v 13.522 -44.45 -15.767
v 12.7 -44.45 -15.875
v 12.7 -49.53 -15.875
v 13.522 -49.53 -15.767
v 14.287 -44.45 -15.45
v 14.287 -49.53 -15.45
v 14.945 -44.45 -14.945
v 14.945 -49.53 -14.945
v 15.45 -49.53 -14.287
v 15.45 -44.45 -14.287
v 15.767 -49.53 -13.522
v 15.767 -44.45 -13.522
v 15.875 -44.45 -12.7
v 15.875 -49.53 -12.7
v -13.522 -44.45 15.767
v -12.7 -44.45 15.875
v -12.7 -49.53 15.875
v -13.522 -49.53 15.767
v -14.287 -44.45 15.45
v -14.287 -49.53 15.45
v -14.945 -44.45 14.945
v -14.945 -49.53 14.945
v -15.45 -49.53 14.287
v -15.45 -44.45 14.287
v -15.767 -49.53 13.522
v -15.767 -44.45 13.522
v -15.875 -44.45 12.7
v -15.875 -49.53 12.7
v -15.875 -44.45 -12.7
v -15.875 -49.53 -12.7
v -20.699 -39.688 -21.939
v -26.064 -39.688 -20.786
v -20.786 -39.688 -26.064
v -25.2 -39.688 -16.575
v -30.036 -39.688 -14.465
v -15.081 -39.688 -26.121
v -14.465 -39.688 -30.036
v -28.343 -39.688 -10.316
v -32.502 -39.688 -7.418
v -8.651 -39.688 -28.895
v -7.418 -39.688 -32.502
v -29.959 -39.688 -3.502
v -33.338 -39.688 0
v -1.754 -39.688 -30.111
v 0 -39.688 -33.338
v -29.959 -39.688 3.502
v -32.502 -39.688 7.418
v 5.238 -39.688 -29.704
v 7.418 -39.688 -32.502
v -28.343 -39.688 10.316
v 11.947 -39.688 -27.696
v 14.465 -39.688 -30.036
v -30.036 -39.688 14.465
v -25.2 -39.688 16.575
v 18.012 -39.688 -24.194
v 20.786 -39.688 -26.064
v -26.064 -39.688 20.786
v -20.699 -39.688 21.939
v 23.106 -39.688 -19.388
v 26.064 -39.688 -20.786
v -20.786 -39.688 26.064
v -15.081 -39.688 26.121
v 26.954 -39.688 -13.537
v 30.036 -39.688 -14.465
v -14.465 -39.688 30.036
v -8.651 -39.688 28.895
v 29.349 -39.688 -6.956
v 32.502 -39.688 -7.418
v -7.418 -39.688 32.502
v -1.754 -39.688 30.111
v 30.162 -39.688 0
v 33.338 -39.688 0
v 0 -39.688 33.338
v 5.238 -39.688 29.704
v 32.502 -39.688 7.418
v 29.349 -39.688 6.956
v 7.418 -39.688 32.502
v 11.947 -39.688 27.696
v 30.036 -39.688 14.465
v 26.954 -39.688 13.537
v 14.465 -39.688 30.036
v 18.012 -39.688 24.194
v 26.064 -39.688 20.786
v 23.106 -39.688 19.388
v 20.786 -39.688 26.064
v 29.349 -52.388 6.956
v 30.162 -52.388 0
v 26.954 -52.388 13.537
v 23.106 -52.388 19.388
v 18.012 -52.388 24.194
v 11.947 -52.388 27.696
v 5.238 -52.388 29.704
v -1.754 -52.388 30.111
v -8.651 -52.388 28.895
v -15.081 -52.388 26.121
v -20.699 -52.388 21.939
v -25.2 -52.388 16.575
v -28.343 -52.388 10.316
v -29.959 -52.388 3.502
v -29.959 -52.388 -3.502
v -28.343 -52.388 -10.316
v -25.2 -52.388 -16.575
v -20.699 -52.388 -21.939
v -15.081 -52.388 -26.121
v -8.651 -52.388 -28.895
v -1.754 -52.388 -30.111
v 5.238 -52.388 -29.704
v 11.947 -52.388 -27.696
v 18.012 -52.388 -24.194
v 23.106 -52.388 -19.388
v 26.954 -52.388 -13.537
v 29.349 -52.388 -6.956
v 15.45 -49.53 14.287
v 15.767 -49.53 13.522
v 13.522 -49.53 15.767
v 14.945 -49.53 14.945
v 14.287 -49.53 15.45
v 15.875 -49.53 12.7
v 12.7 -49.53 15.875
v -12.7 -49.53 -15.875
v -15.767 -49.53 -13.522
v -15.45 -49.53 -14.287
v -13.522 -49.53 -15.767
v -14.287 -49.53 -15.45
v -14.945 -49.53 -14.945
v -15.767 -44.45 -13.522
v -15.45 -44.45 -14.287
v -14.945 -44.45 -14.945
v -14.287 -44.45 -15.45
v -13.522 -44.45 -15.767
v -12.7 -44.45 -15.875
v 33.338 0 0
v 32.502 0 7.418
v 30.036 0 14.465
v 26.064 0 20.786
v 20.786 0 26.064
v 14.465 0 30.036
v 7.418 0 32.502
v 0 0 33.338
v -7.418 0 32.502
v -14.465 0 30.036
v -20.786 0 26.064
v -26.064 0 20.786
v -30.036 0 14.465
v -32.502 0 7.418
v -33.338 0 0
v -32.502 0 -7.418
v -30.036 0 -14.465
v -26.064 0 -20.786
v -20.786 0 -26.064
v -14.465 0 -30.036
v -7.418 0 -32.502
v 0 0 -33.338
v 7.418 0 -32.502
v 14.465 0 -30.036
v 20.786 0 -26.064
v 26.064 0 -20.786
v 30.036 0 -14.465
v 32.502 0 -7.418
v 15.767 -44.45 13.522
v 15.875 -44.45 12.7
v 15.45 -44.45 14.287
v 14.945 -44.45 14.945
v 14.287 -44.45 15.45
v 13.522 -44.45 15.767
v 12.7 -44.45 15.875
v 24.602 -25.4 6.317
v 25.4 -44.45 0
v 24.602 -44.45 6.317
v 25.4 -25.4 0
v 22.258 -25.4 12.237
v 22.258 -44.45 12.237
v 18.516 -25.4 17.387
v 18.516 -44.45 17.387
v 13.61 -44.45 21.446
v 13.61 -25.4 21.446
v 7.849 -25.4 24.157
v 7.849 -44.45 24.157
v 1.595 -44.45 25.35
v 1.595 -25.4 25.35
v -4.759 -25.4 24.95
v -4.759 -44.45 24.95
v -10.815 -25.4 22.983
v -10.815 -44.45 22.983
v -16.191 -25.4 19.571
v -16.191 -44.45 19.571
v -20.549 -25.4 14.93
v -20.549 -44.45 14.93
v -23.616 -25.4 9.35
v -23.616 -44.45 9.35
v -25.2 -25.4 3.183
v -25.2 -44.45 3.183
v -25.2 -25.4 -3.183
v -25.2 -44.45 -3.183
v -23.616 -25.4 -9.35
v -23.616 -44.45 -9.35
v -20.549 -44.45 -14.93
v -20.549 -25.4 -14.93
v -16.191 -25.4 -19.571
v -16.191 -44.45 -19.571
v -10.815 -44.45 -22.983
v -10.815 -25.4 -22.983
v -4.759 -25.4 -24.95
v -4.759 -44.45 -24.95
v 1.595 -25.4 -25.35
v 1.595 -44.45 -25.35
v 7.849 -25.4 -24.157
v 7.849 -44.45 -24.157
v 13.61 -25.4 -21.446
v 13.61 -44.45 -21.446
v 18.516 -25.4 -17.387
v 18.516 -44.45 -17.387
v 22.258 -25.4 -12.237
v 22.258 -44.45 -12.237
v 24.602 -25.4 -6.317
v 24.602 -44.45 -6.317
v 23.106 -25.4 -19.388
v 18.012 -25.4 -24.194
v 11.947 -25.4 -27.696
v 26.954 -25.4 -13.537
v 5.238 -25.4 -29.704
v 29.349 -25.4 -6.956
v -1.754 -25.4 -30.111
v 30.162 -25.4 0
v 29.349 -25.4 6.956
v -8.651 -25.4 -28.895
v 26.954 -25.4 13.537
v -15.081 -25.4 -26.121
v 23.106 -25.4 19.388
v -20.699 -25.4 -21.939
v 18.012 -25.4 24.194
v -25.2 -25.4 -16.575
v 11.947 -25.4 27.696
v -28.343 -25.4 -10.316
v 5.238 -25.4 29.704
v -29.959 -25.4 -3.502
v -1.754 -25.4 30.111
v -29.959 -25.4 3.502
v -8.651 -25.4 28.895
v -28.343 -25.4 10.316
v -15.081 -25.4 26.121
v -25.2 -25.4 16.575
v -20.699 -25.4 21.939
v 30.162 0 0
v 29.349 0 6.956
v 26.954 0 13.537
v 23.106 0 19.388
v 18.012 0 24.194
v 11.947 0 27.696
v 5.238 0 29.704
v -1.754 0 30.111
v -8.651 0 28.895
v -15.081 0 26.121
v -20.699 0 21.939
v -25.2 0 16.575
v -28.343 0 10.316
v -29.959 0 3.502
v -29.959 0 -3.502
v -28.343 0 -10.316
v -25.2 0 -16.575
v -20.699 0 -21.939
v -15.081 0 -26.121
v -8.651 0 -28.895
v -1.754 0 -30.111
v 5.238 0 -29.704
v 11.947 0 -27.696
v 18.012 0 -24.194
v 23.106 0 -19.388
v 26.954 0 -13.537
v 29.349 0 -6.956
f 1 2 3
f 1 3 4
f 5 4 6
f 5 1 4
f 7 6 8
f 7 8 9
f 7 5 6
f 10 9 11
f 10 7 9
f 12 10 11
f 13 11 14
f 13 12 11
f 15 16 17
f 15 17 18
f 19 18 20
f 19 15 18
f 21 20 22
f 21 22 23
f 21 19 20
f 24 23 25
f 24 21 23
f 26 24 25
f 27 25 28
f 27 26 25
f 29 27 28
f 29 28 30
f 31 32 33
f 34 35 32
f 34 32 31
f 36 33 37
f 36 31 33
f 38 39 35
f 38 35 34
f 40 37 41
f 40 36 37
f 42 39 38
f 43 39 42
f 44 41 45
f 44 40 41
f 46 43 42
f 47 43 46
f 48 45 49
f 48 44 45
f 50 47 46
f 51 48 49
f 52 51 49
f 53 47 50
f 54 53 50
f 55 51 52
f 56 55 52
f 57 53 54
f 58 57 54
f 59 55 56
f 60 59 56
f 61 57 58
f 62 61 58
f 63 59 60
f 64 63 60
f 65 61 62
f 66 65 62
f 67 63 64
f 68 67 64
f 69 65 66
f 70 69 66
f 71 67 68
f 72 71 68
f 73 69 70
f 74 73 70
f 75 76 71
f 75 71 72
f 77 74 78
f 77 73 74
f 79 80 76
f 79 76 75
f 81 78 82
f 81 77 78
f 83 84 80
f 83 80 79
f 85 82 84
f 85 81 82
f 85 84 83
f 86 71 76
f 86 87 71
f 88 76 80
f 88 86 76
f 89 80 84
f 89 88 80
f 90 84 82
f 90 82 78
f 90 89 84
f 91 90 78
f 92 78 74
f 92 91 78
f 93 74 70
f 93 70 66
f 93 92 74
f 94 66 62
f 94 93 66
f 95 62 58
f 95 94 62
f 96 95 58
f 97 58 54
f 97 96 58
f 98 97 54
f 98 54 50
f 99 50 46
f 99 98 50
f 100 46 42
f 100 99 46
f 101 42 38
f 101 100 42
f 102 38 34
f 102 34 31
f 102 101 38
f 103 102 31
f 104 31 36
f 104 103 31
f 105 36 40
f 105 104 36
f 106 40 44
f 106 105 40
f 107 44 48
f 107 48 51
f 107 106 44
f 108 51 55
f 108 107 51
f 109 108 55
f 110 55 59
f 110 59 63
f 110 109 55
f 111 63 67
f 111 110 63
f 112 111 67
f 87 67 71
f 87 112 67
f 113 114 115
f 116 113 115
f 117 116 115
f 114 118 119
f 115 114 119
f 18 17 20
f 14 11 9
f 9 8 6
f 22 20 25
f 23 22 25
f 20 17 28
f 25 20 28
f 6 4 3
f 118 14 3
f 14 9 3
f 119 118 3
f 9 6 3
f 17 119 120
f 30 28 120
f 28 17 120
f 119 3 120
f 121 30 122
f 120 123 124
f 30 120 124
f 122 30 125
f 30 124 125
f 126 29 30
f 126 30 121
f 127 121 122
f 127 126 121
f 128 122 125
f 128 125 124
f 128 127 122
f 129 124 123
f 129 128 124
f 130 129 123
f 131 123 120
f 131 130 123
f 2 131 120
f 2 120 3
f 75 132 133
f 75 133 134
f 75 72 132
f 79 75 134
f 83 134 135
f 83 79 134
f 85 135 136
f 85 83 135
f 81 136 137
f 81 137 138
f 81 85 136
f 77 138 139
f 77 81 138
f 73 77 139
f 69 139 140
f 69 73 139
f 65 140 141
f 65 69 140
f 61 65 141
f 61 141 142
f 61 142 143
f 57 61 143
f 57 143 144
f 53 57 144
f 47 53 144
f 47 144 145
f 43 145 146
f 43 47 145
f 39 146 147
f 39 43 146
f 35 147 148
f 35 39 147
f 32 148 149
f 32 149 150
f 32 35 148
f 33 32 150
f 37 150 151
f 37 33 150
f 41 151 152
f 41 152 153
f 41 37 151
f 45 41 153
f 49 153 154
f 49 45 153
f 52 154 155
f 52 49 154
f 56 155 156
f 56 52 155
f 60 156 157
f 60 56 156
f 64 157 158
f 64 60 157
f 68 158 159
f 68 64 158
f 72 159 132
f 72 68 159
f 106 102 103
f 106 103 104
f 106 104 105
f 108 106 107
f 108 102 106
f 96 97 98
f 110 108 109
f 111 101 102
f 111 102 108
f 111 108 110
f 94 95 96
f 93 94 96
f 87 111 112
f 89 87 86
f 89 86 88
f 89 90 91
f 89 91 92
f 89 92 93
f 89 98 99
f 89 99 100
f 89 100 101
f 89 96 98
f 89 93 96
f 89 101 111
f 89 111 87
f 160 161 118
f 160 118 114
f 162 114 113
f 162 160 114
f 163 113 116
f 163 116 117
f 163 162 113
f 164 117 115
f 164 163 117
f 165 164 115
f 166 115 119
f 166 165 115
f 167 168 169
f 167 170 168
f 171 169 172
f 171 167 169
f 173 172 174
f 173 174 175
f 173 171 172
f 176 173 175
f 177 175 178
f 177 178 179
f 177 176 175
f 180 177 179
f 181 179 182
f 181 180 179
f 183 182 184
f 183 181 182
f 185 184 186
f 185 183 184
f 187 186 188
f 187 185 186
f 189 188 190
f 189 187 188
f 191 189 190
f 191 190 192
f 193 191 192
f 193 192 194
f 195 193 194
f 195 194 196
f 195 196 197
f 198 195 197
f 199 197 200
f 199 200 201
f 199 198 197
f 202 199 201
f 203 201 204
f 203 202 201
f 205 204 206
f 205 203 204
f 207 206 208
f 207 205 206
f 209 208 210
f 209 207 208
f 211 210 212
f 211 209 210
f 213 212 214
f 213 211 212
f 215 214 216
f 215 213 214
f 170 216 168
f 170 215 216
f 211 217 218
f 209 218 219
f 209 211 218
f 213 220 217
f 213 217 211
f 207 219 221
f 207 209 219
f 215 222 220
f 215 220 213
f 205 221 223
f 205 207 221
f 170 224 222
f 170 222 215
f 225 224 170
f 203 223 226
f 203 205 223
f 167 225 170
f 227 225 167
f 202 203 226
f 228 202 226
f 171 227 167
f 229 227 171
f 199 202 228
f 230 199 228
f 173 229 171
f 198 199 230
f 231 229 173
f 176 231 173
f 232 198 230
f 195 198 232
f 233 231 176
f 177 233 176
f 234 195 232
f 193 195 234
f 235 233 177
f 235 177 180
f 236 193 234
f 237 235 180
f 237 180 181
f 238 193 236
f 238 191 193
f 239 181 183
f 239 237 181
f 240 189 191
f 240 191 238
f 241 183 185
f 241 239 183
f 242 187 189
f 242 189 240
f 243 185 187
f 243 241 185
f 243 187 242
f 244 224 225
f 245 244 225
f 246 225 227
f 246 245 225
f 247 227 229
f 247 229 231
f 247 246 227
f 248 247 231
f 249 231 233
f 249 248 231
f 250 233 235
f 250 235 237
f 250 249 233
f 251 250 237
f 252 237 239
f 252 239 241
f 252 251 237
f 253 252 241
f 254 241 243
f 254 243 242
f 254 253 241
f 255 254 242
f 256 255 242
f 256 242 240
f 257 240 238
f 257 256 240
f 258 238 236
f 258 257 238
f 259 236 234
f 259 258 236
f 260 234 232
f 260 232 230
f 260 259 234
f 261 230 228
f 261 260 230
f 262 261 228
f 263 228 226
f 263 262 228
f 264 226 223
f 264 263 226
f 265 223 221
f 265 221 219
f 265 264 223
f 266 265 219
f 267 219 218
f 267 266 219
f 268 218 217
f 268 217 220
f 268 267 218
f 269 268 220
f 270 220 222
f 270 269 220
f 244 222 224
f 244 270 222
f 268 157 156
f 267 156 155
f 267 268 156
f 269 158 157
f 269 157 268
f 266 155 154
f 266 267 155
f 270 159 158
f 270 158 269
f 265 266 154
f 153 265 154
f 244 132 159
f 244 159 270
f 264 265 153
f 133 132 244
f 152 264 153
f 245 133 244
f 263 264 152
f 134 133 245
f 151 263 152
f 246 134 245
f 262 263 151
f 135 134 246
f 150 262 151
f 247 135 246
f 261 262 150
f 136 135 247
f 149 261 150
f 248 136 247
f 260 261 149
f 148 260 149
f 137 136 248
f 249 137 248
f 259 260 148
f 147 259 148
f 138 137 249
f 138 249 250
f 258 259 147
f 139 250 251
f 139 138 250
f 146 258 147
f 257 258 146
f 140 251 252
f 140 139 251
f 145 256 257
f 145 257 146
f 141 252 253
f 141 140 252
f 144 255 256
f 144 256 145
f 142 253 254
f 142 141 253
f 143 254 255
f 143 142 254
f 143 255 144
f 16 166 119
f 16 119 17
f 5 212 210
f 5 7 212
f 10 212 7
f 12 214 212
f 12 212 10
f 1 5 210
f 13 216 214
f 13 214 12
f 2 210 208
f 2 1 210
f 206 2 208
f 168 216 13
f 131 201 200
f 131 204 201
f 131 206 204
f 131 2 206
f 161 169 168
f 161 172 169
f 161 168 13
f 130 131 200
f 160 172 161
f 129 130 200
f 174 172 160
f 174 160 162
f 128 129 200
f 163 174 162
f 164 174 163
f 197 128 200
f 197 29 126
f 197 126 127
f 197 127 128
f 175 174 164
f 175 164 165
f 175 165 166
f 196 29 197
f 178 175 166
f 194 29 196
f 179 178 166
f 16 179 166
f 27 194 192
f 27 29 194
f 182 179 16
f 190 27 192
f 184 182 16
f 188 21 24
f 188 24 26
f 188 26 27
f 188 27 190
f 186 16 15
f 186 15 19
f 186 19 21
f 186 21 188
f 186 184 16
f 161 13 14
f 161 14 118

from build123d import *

# Parameters (mm, degrees)
CUT_EXTRUDE1_DEPTH = 5.08


with BuildPart() as part:
    # Sketch1 → Revolve1 (revolve)
    with BuildSketch(Plane.XY):
        Polygon((0, -44.45), (25.4, -44.45), (25.4, -25.4), (30.1625, -25.4), (30.1625, 0), (33.3375, 0), (33.3375, -39.6875), (30.1625, -39.6875), (30.1625, -52.3875), (0, -52.3875), align=None)
    revolve(axis=Axis((0, -44.45, 0), (0, -1, 0)))

    # Sketch2 → Cut-Extrude1 (cut)
    with BuildSketch(Plane(origin=(0, -44.45, 0), x_dir=(1, 0, 0), z_dir=(0, 1, 0))):
        with BuildLine():
            Line((12.7, -15.875), (-12.7, -15.875))
            ThreePointArc((-12.7, -15.875), (-14.94506403, -14.94506403), (-15.875, -12.7))
            Line((-15.875, -12.7), (-15.875, 12.7))
            ThreePointArc((-15.875, 12.7), (-14.94506403, 14.94506403), (-12.7, 15.875))
            Line((-12.7, 15.875), (12.7, 15.875))
            ThreePointArc((12.7, 15.875), (14.94506403, 14.94506403), (15.875, 12.7))
            Line((15.875, 12.7), (15.875, -12.7))
            ThreePointArc((15.875, -12.7), (14.94506403, -14.94506403), (12.7, -15.875))
        make_face()
    extrude(amount=-CUT_EXTRUDE1_DEPTH, mode=Mode.SUBTRACT)


solid = part.part
